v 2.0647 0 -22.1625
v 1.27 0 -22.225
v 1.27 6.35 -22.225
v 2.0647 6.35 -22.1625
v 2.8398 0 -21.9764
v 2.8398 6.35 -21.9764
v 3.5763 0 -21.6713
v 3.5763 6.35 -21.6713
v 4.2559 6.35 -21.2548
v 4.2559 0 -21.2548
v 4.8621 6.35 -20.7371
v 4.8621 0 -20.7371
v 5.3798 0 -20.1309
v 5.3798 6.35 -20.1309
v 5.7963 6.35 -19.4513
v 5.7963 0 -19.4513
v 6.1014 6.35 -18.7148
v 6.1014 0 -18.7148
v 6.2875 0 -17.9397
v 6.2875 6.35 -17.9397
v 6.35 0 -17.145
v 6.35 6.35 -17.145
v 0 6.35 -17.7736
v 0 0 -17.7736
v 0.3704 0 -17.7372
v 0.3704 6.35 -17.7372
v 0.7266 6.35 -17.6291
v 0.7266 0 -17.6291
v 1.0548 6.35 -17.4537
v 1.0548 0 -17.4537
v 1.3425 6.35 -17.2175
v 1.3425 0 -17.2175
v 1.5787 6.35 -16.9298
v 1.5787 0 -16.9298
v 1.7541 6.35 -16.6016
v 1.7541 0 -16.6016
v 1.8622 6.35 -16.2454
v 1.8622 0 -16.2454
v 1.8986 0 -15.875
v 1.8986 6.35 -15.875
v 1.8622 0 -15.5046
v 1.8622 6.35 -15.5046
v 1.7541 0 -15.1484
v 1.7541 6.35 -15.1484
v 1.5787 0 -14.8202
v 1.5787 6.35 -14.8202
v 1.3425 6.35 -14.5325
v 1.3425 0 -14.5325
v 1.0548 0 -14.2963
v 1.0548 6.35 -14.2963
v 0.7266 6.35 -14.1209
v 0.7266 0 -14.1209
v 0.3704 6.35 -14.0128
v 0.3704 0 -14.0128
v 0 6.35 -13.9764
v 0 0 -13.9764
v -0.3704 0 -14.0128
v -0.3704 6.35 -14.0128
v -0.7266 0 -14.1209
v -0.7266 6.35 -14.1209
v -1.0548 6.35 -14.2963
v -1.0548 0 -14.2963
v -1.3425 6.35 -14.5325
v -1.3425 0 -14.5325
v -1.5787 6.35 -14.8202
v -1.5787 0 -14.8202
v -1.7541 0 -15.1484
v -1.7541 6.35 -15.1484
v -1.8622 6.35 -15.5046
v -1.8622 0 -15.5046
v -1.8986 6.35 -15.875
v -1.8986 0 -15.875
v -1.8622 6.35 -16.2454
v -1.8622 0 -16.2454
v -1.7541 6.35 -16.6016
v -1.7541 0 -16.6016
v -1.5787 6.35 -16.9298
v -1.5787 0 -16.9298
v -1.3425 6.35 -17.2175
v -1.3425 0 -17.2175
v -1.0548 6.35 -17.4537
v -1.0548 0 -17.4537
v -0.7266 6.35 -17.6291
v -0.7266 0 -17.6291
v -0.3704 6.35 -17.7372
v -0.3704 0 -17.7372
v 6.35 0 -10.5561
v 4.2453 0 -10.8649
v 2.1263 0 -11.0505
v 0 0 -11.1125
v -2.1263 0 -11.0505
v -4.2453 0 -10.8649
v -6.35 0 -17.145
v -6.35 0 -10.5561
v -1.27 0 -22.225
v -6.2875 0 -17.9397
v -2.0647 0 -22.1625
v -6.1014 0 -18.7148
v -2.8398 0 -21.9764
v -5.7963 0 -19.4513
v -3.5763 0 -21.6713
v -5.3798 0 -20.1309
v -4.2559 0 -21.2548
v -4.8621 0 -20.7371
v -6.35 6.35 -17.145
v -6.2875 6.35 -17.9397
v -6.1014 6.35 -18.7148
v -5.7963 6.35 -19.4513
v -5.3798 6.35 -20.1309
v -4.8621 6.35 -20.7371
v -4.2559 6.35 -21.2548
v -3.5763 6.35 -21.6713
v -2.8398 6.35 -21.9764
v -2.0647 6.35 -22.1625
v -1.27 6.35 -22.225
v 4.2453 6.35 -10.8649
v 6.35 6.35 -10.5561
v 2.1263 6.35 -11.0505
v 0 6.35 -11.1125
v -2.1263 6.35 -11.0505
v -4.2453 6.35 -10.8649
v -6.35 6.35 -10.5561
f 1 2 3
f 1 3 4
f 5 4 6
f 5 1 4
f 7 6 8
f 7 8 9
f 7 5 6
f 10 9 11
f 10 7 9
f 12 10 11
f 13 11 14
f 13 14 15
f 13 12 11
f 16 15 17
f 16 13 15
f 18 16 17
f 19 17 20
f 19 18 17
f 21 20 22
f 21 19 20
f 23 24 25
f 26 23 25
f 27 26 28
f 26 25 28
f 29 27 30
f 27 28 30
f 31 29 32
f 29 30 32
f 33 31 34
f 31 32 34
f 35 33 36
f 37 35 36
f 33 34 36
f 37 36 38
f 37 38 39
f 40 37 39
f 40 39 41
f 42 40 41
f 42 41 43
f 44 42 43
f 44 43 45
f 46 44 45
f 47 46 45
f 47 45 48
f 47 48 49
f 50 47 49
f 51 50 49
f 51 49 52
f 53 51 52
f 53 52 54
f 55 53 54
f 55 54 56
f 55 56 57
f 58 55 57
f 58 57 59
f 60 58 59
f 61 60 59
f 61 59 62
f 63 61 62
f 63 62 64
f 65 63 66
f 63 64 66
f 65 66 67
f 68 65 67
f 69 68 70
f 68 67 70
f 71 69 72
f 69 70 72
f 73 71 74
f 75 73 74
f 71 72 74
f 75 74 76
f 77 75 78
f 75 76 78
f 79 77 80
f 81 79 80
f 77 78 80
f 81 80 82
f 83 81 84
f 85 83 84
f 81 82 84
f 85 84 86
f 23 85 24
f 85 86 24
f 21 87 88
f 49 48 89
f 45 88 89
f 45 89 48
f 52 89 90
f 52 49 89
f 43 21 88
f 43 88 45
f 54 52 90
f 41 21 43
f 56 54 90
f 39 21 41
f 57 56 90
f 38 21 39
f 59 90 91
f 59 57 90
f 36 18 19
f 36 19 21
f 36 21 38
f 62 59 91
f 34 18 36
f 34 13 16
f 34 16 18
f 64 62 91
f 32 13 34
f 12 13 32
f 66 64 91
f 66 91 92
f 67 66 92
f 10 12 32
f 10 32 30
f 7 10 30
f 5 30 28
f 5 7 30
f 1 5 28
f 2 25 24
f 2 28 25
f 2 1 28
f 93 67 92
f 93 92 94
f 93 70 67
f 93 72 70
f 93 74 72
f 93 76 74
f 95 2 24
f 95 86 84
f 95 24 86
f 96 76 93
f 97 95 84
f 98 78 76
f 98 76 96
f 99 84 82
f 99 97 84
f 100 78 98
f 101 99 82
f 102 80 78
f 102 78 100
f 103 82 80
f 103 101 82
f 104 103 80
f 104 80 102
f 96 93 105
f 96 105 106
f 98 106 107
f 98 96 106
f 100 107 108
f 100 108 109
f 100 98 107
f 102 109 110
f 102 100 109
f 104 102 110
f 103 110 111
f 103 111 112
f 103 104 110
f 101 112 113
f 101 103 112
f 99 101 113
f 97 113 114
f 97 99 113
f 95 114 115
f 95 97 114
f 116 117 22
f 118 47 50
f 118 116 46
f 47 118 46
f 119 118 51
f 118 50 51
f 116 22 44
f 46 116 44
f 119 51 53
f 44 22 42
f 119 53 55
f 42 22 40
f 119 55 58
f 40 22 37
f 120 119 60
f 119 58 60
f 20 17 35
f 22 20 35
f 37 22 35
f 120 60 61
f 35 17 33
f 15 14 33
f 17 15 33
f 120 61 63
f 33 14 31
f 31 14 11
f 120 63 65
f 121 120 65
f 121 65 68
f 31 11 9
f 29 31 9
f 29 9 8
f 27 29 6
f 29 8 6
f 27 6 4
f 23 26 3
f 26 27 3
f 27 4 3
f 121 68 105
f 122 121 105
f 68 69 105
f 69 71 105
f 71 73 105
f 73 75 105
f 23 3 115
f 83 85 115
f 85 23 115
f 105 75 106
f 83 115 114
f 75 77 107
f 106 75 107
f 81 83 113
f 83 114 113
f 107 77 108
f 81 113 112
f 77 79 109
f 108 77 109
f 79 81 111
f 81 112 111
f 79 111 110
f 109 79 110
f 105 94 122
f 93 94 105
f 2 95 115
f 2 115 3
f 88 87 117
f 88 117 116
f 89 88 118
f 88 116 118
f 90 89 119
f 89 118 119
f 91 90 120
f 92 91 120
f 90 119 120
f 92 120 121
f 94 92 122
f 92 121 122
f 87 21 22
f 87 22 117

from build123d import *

# Parameters (mm, degrees)
EXTRUDE1_DEPTH            = 6.35
SKETCH2_R                 = 36.5125
CUT_EXTRUDE1_DEPTH        = 6.35
F_6_CLEARANCE_HOLE1_D     = 3.7973
F_6_CLEARANCE_HOLE1_DEPTH = 330.2
F_6_CLEARANCE_HOLE1_TIP   = 1.140824014


with BuildPart() as part:
    # Sketch1 → Extrude1 (new body)
    with BuildSketch(Plane(origin=(0, 0, 0), x_dir=(1, 0, 0), z_dir=(0, 1, 0))):
        with BuildLine():
            Line((-1.27, 22.225), (1.27, 22.225))
            ThreePointArc((1.27, 22.225), (4.862102448, 20.737102448), (6.35, 17.145))
            Line((6.35, 17.145), (6.35, -25.4))
            Line((6.35, -25.4), (-6.35, -25.4))
            Line((-6.35, -25.4), (-6.35, 17.145))
            ThreePointArc((-6.35, 17.145), (-4.862102448, 20.737102448), (-1.27, 22.225))
        make_face()
    extrude(amount=EXTRUDE1_DEPTH)

    # Sketch2 → Cut-Extrude1 (cut)
    with BuildSketch(Plane(origin=(0, 6.35, 0), x_dir=(-1, 0, 0), z_dir=(0, 1, 0))):
        with Locations((0, 25.4)):
            Circle(SKETCH2_R)
    extrude(amount=-CUT_EXTRUDE1_DEPTH, mode=Mode.SUBTRACT)

    # #6 Clearance Hole1
    with Locations(Plane(origin=(0, 6.35, -15.875), x_dir=(0, 0, 1), z_dir=(0, 1, 0))):
        with Locations((0, 0)):
            Hole(F_6_CLEARANCE_HOLE1_D / 2, depth=F_6_CLEARANCE_HOLE1_DEPTH)
            with Locations((0, 0, -(F_6_CLEARANCE_HOLE1_DEPTH + F_6_CLEARANCE_HOLE1_TIP / 2))):  # 118° drill point
                Cone(0, F_6_CLEARANCE_HOLE1_D / 2, F_6_CLEARANCE_HOLE1_TIP, mode=Mode.SUBTRACT)


solid = part.part
